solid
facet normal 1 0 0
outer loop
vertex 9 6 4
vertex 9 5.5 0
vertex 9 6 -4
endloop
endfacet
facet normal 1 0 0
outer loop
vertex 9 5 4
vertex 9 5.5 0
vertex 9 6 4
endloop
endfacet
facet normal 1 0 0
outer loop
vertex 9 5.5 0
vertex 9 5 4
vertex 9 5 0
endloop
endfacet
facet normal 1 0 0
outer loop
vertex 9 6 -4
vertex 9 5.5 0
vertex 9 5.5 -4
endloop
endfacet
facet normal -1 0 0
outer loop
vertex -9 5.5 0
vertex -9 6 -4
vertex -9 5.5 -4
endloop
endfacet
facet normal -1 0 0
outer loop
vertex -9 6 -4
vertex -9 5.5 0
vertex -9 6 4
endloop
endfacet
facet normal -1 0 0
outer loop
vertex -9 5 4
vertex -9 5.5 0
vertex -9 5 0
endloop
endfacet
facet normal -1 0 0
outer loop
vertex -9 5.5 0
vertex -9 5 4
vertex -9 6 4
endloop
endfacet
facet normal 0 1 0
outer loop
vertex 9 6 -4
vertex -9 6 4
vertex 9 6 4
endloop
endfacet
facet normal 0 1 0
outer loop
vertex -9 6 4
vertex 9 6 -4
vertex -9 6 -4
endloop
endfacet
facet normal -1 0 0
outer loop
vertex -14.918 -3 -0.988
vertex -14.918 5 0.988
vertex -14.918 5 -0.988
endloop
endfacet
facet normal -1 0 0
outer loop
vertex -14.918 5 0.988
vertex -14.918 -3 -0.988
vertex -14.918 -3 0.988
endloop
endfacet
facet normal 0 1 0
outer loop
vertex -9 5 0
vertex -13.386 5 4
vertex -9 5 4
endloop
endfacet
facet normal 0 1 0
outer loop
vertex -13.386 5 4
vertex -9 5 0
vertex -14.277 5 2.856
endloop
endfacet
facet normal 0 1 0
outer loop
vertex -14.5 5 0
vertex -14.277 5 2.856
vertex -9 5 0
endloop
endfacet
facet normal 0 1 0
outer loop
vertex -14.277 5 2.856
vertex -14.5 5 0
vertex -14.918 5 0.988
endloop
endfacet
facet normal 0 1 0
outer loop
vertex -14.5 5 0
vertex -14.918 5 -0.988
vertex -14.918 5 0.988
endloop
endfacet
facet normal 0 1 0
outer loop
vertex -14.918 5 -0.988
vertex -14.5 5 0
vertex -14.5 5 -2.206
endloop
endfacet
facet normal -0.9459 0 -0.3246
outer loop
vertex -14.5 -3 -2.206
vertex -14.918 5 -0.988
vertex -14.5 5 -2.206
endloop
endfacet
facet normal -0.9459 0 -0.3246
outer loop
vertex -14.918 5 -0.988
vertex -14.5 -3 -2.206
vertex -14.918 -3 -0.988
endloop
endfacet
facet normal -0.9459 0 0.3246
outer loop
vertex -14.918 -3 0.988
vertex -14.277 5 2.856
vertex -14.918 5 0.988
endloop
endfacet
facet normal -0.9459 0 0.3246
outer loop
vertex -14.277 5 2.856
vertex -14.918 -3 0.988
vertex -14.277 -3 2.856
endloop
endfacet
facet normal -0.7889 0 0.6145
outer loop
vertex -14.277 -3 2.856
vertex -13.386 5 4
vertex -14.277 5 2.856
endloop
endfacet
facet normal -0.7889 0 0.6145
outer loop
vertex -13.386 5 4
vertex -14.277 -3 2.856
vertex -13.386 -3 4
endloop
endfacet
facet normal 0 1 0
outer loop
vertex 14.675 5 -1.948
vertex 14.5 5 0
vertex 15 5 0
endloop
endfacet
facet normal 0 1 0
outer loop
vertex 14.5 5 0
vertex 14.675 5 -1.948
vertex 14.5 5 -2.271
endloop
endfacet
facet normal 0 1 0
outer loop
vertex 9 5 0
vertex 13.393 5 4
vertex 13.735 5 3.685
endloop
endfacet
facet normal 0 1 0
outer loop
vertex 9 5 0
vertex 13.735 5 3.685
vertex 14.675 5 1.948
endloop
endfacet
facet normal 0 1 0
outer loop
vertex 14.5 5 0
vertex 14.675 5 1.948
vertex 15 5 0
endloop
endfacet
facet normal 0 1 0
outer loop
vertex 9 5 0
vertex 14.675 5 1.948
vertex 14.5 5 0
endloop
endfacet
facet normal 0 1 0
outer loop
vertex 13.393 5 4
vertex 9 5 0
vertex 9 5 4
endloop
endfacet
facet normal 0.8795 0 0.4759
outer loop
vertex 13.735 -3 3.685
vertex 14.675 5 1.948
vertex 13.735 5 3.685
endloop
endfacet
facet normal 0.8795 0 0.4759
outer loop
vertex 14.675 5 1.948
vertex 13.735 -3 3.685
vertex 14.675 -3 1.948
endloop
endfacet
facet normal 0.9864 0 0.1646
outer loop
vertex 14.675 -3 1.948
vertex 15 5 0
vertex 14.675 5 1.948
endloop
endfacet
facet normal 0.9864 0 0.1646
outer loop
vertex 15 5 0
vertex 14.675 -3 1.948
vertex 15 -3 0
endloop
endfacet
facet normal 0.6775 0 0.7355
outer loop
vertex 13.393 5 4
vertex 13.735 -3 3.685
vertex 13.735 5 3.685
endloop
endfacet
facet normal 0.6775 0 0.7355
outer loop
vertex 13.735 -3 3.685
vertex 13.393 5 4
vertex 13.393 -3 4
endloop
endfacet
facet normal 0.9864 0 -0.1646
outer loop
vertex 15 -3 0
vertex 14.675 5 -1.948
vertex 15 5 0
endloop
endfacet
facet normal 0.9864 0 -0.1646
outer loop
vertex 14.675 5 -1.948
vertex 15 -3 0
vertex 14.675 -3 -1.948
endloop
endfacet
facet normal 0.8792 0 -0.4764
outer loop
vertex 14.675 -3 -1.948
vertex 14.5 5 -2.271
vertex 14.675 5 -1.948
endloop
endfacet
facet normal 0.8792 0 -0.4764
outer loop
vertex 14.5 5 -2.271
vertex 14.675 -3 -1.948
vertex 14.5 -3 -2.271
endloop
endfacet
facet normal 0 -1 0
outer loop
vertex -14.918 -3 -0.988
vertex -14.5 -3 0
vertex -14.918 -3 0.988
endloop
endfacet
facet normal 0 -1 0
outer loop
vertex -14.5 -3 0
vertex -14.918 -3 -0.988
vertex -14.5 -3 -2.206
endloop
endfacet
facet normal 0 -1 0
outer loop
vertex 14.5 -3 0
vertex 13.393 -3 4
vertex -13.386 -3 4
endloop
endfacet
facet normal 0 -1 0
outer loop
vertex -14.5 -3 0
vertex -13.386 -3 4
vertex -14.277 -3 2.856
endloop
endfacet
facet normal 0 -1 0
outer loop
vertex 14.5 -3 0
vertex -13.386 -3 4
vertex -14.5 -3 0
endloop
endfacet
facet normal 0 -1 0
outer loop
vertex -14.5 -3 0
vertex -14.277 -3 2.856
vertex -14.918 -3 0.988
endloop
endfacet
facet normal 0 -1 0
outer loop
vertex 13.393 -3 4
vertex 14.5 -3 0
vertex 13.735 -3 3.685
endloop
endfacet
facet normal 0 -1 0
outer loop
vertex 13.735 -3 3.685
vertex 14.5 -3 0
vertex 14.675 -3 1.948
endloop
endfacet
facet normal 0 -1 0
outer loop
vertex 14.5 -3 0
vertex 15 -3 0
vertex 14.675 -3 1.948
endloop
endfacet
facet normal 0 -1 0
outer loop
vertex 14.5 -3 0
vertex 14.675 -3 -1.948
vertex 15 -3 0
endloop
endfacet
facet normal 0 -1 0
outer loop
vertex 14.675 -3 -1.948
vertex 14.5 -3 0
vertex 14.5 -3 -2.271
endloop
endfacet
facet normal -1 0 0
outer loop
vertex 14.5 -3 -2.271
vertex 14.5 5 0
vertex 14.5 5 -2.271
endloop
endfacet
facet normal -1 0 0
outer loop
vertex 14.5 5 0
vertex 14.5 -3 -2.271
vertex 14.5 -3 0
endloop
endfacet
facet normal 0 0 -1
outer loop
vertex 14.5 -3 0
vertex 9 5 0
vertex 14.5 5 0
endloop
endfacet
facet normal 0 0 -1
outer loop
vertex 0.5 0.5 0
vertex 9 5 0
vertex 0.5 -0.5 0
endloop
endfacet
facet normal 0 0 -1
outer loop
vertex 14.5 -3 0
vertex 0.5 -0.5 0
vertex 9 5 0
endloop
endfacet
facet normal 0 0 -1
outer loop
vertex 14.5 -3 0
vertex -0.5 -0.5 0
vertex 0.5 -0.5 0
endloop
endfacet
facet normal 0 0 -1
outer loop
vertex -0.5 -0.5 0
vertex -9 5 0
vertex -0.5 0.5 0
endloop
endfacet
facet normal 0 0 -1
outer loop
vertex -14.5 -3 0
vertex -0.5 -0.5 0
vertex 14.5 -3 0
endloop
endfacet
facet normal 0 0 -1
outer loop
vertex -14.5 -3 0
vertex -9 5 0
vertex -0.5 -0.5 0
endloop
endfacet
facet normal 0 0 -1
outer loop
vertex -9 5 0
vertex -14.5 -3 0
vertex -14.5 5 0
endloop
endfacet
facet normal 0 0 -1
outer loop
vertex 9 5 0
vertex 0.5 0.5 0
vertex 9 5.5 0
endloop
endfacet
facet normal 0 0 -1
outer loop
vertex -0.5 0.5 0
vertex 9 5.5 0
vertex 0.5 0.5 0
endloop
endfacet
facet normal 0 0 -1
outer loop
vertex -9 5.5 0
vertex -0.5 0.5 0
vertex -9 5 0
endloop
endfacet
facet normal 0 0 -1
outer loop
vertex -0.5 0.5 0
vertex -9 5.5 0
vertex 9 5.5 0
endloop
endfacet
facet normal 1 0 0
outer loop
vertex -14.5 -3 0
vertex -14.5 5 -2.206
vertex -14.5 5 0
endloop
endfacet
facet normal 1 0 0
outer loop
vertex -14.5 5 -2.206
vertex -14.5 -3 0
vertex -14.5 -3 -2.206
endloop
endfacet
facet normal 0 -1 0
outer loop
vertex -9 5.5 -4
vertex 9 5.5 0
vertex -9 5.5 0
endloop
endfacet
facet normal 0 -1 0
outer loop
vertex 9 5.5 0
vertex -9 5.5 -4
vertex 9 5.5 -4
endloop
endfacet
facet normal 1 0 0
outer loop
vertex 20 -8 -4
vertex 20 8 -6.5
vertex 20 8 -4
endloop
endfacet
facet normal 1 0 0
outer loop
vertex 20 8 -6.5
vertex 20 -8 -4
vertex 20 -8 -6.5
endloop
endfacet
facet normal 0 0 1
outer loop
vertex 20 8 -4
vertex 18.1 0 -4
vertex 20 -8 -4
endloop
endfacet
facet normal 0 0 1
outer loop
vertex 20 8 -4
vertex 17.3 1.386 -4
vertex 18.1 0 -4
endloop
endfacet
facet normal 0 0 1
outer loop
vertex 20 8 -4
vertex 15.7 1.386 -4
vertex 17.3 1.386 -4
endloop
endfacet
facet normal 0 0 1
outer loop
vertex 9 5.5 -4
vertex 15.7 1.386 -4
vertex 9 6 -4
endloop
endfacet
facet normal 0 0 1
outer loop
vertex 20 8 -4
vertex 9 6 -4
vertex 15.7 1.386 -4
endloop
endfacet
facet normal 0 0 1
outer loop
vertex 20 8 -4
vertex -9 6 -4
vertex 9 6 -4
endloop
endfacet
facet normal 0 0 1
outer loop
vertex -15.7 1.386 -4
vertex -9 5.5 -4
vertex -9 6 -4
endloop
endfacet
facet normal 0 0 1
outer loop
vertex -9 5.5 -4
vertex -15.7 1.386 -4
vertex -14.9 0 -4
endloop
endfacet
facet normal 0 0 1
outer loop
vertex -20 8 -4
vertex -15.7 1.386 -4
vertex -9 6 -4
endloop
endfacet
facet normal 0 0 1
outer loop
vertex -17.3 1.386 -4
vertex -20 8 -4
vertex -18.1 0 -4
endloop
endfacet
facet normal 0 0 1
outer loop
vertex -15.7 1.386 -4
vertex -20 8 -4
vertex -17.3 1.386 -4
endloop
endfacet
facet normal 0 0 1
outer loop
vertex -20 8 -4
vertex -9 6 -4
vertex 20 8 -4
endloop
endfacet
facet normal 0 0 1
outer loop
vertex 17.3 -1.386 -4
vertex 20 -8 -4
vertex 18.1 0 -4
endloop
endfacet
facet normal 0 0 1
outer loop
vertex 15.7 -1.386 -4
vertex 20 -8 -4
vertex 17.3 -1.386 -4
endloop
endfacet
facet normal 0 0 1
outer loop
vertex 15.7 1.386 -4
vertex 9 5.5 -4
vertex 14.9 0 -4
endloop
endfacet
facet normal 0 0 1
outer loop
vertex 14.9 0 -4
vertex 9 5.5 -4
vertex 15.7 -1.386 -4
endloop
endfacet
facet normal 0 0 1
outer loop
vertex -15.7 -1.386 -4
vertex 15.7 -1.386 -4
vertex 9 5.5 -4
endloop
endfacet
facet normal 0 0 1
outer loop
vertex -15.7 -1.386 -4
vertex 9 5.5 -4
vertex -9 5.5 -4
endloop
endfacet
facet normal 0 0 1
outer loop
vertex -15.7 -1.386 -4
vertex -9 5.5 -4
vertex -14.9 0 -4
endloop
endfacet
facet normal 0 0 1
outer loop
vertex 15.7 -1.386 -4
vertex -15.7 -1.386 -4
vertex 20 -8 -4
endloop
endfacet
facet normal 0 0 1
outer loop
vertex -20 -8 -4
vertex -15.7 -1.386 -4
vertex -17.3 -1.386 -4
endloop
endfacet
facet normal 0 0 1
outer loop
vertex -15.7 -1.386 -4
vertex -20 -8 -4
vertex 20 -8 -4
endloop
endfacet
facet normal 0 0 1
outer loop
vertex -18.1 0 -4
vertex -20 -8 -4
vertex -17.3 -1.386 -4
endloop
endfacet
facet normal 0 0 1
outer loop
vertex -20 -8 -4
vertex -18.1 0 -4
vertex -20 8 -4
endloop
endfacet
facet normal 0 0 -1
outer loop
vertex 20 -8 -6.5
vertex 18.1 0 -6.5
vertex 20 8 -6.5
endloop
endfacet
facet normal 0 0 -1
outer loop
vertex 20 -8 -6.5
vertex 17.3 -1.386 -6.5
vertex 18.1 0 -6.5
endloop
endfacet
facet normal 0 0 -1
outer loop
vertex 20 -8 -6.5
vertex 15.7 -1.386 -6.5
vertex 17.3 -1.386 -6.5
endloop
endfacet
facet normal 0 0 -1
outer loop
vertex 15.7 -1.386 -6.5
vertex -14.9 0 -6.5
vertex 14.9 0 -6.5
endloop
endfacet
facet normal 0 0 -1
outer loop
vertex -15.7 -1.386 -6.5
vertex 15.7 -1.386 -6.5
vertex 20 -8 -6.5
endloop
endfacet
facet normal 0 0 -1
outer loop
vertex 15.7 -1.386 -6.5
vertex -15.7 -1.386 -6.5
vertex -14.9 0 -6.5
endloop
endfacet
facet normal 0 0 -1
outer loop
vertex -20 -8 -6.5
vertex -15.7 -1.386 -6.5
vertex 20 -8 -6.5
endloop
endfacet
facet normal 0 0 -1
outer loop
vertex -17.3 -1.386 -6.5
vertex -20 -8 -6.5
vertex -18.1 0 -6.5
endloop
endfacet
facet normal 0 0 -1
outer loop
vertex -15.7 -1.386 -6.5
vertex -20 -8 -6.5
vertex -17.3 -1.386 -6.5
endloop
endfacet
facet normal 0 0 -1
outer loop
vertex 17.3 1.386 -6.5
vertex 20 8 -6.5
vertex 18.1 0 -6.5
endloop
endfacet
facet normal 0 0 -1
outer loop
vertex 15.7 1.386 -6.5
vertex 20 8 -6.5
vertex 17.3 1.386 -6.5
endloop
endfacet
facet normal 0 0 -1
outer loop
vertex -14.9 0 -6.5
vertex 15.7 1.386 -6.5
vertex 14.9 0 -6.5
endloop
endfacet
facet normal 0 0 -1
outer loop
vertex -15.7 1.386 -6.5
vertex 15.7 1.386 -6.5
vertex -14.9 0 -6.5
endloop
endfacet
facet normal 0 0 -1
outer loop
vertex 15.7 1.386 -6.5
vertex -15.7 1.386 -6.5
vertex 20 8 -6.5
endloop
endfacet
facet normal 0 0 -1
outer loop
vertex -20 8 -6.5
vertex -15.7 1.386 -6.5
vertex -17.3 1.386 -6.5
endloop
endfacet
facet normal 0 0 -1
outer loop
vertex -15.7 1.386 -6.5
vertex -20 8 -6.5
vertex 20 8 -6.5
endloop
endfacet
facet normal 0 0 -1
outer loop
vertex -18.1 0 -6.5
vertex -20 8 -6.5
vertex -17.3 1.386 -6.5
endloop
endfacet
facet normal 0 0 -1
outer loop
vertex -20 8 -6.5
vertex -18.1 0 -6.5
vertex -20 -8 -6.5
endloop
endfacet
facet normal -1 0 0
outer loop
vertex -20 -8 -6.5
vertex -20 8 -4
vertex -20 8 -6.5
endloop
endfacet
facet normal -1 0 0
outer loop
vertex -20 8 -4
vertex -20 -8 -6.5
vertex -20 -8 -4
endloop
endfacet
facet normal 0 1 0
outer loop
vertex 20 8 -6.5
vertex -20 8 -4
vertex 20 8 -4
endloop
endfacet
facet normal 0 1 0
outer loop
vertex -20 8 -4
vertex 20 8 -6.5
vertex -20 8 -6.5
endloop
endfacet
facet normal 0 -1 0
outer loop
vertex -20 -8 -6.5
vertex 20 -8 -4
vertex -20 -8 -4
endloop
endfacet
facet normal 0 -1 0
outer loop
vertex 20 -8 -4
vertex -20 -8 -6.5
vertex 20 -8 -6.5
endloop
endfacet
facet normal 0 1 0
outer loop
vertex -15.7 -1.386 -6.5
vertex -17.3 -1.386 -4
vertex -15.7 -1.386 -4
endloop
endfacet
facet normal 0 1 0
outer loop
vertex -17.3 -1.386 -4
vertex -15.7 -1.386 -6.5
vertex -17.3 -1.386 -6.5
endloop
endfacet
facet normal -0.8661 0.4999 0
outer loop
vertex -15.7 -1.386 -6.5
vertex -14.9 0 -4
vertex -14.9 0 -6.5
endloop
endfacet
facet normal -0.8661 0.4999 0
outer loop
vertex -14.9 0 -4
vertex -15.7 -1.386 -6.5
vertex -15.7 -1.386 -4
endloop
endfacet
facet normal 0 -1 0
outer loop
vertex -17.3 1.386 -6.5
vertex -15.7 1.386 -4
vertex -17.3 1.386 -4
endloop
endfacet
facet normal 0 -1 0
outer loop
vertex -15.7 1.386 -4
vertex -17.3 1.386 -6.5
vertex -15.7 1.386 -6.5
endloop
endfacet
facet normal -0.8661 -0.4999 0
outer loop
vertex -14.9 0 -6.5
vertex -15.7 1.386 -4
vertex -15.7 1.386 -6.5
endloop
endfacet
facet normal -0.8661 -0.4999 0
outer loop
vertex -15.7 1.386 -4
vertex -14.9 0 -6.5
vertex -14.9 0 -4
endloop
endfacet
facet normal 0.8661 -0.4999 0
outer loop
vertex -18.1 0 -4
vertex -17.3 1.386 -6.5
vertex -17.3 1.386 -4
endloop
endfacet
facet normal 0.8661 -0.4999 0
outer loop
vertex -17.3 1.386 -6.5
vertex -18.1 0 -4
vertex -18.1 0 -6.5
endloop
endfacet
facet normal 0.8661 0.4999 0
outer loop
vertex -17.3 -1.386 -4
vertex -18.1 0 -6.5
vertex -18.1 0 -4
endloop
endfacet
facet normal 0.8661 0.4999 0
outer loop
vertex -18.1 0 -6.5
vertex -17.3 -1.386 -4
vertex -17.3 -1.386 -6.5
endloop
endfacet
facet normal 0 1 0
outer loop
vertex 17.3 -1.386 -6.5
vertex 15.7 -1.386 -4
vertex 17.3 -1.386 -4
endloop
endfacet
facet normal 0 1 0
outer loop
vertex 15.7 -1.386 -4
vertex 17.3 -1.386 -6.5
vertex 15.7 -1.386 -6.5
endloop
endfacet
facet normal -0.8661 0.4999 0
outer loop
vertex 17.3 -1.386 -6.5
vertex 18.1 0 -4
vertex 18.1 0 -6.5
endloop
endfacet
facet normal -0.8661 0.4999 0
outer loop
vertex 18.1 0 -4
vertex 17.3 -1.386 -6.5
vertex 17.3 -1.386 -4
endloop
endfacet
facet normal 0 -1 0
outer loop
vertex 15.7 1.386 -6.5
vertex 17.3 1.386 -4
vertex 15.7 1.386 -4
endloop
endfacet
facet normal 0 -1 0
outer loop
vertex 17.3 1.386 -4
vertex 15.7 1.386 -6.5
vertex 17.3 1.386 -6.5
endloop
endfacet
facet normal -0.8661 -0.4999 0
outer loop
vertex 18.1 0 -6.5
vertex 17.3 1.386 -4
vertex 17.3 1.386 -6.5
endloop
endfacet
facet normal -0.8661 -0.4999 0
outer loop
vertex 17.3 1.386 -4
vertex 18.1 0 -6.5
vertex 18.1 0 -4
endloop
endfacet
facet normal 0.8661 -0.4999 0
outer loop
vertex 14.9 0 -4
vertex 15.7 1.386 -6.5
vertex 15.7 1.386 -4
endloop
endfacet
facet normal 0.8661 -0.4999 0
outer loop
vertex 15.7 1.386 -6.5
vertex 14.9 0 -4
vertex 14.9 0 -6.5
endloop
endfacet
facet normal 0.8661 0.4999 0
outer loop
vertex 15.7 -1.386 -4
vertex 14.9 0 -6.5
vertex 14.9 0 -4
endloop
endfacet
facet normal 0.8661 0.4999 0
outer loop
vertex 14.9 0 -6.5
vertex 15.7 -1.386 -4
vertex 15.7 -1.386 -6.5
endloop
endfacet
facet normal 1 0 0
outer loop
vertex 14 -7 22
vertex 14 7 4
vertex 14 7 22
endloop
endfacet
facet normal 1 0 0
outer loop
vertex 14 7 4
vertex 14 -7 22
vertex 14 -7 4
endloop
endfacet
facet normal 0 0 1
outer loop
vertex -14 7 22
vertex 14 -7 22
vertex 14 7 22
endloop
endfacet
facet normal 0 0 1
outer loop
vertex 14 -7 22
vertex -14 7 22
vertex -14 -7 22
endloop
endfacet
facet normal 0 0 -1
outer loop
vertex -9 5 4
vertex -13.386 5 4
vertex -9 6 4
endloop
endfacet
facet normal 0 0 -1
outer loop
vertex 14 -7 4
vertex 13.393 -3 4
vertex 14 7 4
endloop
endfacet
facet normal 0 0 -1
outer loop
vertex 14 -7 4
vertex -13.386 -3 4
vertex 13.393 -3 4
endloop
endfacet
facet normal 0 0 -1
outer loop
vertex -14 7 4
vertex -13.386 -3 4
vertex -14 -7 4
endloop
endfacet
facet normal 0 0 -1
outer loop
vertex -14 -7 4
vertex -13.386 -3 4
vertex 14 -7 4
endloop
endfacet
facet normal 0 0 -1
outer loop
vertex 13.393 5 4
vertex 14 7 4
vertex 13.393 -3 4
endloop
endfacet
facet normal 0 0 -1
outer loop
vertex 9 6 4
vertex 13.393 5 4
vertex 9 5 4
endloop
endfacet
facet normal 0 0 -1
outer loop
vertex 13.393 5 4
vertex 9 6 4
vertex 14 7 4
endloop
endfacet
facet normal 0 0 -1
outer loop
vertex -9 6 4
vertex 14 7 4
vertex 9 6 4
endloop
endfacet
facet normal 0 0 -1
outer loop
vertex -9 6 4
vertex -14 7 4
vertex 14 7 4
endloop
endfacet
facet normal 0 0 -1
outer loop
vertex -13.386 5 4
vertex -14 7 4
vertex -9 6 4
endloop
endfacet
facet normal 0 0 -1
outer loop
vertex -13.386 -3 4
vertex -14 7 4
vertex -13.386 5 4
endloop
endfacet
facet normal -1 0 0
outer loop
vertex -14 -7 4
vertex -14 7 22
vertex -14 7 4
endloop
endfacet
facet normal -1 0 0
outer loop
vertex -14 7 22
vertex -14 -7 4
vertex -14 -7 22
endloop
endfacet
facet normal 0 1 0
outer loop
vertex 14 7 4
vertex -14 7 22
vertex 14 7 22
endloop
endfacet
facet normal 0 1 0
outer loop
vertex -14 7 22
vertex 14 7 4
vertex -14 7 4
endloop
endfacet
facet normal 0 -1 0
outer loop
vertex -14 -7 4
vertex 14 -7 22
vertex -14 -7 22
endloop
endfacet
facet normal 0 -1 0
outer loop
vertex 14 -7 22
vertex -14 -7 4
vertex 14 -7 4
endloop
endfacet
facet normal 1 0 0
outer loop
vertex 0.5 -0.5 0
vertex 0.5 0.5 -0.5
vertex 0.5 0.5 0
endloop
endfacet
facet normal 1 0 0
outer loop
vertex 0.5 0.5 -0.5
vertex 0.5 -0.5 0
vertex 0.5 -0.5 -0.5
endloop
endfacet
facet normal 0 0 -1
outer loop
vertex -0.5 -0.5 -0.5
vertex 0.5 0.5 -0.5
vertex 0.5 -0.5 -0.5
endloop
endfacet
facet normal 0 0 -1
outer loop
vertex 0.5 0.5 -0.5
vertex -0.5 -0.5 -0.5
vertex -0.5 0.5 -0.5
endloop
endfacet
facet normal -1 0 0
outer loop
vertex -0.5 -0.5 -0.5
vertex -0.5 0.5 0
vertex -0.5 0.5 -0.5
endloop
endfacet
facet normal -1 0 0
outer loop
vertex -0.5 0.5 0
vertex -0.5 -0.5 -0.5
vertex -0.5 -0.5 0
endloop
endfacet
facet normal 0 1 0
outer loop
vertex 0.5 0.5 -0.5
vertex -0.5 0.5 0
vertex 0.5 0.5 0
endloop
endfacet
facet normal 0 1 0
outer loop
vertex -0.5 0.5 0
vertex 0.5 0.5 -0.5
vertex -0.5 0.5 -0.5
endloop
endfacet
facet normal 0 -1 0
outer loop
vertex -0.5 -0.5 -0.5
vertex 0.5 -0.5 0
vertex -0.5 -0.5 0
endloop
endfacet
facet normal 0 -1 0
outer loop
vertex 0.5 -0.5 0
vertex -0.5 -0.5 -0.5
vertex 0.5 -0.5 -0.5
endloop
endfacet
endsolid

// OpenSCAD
// Parameters
shell_W = 30; //[15:60:1]
shell_H = 12; //[6:24:1]
shell_D = 10; //[5:20:1]
shell_corner_r = 6; //[3:12:1]
flange_W = 40; //[20:80:1]
flange_H = 16; //[8:32:1]
flange_t = 2.5; //[1.25:5:0.5]
mount_hole_d = 3.2; //[1.6:6.4:0.1]
mount_hole_spacing = 33; //[16.5:66:0.5]
rear_W = 28; //[14:56:1]
rear_H = 14; //[7:28:1]
rear_D = 18; //[9:36:1]
front_opening_clearance = 0.5; //[0.25:2:0.25]
overlap = 1; //[0.5:2:0.5]
shell_endcap_r = 6; //[3:12:1]
front_opening_depth = 6; //[3:12:1]

// Base Shapes
module d_shell_center_block() {
  translate([0, 0, 0])
    cube([shell_W - 2*shell_endcap_r, shell_H, shell_D], center=true);
}

module d_shell_endcap_left() {
  translate([-(shell_W/2 - shell_endcap_r), 0, 0])
    rotate([90, 0, 0])
      cylinder(r=shell_endcap_r, h=shell_D, center=true);
}

module d_shell_endcap_right() {
  translate([(shell_W/2 - shell_endcap_r), 0, 0])
    rotate([90, 0, 0])
      cylinder(r=shell_endcap_r, h=shell_D, center=true);
}

module d_shell_flatten_cut() {
  translate([0, -(shell_H/2 + shell_H/4), 0])
    cube([shell_W + 2*overlap, shell_H, shell_D + 2*overlap], center=true);
}

module flange_plate() {
  translate([0, 0, -(shell_D/2 + flange_t/2 - overlap)])
    cube([flange_W, flange_H, flange_t], center=true);
}

module mounting_hole_left() {
  translate([-mount_hole_spacing/2, 0, -(shell_D/2 + flange_t/2 - overlap)])
    cylinder(r=mount_hole_d/2, h=flange_t + 2*overlap, center=true);
}

module mounting_hole_right() {
  translate([mount_hole_spacing/2, 0, -(shell_D/2 + flange_t/2 - overlap)])
    cylinder(r=mount_hole_d/2, h=flange_t + 2*overlap, center=true);
}

module rear_housing_block() {
  translate([0, 0, (shell_D/2 + rear_D/2 - overlap)])
    cube([rear_W, rear_H, rear_D], center=true);
}

module front_opening_cutout() {
  translate([0, 0, -(shell_D/2 - front_opening_depth/2 + overlap)])
    cube([shell_W - 2*front_opening_clearance, shell_H - 2*front_opening_clearance, front_opening_depth], center=true);
}

// Operations
module d_shell_union_raw() {
  union() {
    d_shell_center_block();
    d_shell_endcap_left();
    d_shell_endcap_right();
  }
}

module d_shell_body() {
  difference() {
    d_shell_union_raw();
    d_shell_flatten_cut();
  }
}

module front_shell_with_opening() {
  difference() {
    d_shell_body();
    front_opening_cutout();
  }
}

module front_with_flange() {
  union() {
    front_shell_with_opening();
    flange_plate();
  }
}

module front_with_flange_and_holes() {
  difference() {
    front_with_flange();
    mounting_hole_left();
    mounting_hole_right();
  }
}

module connector_main_solid() {
  union() {
    front_with_flange_and_holes();
    rear_housing_block();
  }
}

module complete_model() {
  union() {
    connector_main_solid();
    // Placeholder components
    translate([0, 0, 0]) cube([overlap, overlap, overlap], center=true); // pins_or_sockets_array
    translate([0, 0, 0]) cube([overlap, overlap, overlap], center=true); // jackscrews
    translate([0, 0, 0]) cube([overlap, overlap, overlap], center=true); // strain_relief
    translate([0, 0, 0]) cube([overlap, overlap, overlap], center=true); // chamfers_fillets
    translate([0, 0, 0]) cube([overlap, overlap, overlap], center=true); // embossed_labels
  }
}

// Final Output
complete_model();
